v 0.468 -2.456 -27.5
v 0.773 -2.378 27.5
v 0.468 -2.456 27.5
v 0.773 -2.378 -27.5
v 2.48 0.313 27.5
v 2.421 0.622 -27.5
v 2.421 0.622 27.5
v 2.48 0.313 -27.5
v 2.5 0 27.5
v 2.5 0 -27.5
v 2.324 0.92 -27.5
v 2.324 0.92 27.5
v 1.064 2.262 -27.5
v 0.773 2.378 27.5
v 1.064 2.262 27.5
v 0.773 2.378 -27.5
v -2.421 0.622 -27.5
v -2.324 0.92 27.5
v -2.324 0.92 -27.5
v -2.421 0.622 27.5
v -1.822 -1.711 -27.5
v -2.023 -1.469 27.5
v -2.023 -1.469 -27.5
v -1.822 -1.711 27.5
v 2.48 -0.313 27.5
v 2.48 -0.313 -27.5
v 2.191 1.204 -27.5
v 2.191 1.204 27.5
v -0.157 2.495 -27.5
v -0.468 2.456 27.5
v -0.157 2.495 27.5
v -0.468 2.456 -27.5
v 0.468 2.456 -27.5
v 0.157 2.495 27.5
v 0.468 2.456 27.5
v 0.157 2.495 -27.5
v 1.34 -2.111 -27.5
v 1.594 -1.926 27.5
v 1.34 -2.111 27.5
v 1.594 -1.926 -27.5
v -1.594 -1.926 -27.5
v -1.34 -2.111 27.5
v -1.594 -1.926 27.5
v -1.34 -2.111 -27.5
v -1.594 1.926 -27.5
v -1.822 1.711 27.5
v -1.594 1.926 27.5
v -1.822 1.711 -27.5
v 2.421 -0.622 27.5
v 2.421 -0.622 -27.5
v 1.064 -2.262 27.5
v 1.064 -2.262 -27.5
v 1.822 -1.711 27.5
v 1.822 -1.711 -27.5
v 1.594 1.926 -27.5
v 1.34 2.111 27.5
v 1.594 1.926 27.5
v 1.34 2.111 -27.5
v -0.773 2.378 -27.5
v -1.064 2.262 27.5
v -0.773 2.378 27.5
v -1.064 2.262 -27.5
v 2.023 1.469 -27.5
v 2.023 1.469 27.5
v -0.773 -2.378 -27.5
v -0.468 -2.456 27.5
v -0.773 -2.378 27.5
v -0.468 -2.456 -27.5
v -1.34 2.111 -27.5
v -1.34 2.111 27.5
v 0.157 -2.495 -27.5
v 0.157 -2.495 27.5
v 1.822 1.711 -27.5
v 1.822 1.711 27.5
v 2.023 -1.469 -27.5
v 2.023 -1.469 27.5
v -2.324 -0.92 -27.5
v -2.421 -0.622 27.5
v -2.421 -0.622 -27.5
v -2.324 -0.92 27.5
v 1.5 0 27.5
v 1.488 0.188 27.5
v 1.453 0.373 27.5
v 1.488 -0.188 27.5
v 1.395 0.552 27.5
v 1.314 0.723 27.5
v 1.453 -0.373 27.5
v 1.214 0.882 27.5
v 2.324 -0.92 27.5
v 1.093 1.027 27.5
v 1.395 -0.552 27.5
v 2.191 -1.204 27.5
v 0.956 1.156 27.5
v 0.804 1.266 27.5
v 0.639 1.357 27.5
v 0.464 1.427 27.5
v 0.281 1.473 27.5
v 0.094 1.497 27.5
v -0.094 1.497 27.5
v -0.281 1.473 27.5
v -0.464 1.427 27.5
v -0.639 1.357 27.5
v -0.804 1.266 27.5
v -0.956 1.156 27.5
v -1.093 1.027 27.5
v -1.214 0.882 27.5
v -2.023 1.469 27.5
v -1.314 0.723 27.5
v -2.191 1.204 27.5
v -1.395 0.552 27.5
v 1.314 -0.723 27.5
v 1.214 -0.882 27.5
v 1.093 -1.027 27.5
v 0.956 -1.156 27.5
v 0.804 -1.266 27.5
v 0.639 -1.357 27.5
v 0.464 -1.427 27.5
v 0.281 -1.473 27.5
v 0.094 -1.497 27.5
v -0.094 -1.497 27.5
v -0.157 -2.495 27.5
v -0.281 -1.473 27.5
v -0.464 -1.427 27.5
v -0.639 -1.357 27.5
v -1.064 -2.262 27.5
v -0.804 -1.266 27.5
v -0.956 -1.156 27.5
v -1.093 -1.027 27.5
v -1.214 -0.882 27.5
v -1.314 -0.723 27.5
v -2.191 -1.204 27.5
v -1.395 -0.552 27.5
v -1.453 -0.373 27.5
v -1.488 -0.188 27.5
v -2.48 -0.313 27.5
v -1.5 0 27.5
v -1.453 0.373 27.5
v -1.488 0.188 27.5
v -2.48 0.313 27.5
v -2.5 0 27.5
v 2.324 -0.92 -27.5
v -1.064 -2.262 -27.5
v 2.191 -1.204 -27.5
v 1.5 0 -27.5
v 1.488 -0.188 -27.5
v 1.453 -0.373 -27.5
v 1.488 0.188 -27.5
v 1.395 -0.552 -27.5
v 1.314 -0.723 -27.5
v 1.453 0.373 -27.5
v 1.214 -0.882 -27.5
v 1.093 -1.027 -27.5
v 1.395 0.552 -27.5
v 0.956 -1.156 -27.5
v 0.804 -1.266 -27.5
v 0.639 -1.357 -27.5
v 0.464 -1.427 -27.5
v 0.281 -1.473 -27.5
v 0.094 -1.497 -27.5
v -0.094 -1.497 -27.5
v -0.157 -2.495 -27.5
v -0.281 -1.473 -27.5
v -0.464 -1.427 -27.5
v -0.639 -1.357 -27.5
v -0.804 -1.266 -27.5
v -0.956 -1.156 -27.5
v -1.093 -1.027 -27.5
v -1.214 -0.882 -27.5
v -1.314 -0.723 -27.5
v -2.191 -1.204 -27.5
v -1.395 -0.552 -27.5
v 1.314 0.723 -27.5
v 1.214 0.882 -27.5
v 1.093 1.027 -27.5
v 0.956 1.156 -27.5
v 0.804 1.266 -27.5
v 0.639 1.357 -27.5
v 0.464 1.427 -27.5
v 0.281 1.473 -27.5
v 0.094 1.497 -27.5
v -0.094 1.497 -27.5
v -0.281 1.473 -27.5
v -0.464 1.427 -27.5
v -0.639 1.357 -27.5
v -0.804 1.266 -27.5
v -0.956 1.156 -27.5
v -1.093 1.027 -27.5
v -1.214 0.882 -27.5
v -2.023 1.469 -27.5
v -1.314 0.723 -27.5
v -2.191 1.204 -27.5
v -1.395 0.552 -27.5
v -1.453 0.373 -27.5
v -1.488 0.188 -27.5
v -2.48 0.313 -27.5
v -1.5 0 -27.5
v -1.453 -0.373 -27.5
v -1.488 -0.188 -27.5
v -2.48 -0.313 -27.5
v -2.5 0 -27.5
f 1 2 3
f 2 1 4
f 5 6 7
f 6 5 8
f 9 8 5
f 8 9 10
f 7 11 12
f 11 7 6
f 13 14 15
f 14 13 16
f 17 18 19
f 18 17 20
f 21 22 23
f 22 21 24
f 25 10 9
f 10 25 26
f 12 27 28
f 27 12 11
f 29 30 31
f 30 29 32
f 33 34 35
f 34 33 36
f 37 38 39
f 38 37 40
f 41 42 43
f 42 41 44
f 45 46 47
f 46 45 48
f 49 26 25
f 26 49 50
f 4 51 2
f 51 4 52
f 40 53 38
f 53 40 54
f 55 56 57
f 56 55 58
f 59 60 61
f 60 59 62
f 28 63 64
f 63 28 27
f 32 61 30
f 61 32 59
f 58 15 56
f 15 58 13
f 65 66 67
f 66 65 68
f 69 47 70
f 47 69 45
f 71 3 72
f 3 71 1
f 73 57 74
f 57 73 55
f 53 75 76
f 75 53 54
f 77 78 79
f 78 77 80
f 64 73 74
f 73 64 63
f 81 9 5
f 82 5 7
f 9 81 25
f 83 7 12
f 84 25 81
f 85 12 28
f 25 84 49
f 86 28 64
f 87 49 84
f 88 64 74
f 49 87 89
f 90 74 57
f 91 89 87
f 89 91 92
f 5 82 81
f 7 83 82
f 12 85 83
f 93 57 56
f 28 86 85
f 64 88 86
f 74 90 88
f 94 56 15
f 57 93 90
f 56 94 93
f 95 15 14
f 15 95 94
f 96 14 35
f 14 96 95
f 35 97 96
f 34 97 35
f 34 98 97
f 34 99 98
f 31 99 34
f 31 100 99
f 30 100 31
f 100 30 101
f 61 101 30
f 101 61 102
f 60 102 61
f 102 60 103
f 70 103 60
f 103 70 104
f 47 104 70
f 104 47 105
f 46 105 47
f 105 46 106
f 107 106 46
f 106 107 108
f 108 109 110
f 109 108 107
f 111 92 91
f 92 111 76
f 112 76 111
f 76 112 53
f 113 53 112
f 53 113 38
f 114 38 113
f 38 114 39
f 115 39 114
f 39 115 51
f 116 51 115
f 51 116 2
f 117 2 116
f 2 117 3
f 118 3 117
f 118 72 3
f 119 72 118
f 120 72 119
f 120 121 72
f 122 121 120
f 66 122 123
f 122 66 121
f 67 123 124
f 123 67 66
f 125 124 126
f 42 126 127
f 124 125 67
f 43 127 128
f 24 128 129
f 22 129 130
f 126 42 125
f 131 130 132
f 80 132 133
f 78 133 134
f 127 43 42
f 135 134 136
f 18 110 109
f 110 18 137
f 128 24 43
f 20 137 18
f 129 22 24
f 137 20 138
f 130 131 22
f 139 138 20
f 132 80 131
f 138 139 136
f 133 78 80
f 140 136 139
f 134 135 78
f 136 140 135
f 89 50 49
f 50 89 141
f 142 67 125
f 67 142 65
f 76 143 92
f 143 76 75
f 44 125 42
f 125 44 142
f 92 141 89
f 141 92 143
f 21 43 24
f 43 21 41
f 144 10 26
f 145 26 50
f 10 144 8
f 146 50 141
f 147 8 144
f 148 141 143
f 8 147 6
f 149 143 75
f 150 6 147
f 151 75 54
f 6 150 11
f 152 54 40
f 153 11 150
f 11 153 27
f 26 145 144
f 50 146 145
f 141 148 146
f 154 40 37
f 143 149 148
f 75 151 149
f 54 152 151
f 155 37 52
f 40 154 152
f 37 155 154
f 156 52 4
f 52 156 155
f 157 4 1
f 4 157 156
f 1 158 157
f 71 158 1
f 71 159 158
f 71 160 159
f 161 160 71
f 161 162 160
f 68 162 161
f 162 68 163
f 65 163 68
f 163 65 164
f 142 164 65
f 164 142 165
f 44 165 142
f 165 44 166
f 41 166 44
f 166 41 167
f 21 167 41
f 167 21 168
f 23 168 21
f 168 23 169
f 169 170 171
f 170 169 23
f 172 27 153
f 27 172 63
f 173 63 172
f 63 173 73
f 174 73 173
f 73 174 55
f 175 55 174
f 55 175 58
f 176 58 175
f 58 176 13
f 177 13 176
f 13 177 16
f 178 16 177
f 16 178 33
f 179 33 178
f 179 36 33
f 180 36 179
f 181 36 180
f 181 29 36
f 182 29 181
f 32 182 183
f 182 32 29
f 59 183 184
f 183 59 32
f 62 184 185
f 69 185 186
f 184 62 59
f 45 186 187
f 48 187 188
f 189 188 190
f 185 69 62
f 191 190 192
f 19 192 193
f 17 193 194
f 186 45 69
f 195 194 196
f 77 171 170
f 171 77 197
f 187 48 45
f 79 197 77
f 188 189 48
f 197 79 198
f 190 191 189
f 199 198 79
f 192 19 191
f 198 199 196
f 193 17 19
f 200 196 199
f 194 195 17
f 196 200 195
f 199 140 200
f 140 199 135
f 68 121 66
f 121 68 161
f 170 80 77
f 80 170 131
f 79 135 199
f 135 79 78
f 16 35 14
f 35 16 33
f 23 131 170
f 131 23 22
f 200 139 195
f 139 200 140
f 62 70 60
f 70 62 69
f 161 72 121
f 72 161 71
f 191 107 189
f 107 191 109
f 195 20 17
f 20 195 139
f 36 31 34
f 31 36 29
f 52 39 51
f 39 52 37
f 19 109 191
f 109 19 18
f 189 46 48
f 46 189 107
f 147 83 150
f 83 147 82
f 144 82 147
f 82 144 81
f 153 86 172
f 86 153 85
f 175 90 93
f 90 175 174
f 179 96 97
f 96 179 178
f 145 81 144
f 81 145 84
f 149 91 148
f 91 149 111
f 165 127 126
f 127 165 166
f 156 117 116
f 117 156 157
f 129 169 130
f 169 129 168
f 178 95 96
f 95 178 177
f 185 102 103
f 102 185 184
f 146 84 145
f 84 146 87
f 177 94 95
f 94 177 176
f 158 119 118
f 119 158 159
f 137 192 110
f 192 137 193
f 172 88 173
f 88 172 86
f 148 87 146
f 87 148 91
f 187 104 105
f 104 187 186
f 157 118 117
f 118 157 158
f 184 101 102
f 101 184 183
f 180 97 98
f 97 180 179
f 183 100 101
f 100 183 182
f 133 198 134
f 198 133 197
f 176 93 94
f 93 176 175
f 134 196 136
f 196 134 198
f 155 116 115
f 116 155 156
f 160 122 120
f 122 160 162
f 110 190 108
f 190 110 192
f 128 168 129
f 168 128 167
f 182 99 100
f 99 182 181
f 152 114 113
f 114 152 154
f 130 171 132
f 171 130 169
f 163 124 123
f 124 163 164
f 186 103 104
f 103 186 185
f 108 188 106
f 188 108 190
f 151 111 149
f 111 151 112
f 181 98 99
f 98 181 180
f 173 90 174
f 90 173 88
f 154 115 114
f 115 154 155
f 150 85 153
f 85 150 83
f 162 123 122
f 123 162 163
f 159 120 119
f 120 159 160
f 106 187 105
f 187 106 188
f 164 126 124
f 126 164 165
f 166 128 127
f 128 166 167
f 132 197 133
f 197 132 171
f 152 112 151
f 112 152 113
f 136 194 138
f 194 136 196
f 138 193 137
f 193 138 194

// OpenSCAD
$fn = 50;


difference() {
	union() {
		translate(v = [0, 0, -27.5000000000]) {
			cylinder(h = 55, r = 2.5000000000);
		}
	}
	union() {
		translate(v = [0, 0, -100.0000000000]) {
			cylinder(h = 200, r = 1.5000000000);
		}
	}
}
